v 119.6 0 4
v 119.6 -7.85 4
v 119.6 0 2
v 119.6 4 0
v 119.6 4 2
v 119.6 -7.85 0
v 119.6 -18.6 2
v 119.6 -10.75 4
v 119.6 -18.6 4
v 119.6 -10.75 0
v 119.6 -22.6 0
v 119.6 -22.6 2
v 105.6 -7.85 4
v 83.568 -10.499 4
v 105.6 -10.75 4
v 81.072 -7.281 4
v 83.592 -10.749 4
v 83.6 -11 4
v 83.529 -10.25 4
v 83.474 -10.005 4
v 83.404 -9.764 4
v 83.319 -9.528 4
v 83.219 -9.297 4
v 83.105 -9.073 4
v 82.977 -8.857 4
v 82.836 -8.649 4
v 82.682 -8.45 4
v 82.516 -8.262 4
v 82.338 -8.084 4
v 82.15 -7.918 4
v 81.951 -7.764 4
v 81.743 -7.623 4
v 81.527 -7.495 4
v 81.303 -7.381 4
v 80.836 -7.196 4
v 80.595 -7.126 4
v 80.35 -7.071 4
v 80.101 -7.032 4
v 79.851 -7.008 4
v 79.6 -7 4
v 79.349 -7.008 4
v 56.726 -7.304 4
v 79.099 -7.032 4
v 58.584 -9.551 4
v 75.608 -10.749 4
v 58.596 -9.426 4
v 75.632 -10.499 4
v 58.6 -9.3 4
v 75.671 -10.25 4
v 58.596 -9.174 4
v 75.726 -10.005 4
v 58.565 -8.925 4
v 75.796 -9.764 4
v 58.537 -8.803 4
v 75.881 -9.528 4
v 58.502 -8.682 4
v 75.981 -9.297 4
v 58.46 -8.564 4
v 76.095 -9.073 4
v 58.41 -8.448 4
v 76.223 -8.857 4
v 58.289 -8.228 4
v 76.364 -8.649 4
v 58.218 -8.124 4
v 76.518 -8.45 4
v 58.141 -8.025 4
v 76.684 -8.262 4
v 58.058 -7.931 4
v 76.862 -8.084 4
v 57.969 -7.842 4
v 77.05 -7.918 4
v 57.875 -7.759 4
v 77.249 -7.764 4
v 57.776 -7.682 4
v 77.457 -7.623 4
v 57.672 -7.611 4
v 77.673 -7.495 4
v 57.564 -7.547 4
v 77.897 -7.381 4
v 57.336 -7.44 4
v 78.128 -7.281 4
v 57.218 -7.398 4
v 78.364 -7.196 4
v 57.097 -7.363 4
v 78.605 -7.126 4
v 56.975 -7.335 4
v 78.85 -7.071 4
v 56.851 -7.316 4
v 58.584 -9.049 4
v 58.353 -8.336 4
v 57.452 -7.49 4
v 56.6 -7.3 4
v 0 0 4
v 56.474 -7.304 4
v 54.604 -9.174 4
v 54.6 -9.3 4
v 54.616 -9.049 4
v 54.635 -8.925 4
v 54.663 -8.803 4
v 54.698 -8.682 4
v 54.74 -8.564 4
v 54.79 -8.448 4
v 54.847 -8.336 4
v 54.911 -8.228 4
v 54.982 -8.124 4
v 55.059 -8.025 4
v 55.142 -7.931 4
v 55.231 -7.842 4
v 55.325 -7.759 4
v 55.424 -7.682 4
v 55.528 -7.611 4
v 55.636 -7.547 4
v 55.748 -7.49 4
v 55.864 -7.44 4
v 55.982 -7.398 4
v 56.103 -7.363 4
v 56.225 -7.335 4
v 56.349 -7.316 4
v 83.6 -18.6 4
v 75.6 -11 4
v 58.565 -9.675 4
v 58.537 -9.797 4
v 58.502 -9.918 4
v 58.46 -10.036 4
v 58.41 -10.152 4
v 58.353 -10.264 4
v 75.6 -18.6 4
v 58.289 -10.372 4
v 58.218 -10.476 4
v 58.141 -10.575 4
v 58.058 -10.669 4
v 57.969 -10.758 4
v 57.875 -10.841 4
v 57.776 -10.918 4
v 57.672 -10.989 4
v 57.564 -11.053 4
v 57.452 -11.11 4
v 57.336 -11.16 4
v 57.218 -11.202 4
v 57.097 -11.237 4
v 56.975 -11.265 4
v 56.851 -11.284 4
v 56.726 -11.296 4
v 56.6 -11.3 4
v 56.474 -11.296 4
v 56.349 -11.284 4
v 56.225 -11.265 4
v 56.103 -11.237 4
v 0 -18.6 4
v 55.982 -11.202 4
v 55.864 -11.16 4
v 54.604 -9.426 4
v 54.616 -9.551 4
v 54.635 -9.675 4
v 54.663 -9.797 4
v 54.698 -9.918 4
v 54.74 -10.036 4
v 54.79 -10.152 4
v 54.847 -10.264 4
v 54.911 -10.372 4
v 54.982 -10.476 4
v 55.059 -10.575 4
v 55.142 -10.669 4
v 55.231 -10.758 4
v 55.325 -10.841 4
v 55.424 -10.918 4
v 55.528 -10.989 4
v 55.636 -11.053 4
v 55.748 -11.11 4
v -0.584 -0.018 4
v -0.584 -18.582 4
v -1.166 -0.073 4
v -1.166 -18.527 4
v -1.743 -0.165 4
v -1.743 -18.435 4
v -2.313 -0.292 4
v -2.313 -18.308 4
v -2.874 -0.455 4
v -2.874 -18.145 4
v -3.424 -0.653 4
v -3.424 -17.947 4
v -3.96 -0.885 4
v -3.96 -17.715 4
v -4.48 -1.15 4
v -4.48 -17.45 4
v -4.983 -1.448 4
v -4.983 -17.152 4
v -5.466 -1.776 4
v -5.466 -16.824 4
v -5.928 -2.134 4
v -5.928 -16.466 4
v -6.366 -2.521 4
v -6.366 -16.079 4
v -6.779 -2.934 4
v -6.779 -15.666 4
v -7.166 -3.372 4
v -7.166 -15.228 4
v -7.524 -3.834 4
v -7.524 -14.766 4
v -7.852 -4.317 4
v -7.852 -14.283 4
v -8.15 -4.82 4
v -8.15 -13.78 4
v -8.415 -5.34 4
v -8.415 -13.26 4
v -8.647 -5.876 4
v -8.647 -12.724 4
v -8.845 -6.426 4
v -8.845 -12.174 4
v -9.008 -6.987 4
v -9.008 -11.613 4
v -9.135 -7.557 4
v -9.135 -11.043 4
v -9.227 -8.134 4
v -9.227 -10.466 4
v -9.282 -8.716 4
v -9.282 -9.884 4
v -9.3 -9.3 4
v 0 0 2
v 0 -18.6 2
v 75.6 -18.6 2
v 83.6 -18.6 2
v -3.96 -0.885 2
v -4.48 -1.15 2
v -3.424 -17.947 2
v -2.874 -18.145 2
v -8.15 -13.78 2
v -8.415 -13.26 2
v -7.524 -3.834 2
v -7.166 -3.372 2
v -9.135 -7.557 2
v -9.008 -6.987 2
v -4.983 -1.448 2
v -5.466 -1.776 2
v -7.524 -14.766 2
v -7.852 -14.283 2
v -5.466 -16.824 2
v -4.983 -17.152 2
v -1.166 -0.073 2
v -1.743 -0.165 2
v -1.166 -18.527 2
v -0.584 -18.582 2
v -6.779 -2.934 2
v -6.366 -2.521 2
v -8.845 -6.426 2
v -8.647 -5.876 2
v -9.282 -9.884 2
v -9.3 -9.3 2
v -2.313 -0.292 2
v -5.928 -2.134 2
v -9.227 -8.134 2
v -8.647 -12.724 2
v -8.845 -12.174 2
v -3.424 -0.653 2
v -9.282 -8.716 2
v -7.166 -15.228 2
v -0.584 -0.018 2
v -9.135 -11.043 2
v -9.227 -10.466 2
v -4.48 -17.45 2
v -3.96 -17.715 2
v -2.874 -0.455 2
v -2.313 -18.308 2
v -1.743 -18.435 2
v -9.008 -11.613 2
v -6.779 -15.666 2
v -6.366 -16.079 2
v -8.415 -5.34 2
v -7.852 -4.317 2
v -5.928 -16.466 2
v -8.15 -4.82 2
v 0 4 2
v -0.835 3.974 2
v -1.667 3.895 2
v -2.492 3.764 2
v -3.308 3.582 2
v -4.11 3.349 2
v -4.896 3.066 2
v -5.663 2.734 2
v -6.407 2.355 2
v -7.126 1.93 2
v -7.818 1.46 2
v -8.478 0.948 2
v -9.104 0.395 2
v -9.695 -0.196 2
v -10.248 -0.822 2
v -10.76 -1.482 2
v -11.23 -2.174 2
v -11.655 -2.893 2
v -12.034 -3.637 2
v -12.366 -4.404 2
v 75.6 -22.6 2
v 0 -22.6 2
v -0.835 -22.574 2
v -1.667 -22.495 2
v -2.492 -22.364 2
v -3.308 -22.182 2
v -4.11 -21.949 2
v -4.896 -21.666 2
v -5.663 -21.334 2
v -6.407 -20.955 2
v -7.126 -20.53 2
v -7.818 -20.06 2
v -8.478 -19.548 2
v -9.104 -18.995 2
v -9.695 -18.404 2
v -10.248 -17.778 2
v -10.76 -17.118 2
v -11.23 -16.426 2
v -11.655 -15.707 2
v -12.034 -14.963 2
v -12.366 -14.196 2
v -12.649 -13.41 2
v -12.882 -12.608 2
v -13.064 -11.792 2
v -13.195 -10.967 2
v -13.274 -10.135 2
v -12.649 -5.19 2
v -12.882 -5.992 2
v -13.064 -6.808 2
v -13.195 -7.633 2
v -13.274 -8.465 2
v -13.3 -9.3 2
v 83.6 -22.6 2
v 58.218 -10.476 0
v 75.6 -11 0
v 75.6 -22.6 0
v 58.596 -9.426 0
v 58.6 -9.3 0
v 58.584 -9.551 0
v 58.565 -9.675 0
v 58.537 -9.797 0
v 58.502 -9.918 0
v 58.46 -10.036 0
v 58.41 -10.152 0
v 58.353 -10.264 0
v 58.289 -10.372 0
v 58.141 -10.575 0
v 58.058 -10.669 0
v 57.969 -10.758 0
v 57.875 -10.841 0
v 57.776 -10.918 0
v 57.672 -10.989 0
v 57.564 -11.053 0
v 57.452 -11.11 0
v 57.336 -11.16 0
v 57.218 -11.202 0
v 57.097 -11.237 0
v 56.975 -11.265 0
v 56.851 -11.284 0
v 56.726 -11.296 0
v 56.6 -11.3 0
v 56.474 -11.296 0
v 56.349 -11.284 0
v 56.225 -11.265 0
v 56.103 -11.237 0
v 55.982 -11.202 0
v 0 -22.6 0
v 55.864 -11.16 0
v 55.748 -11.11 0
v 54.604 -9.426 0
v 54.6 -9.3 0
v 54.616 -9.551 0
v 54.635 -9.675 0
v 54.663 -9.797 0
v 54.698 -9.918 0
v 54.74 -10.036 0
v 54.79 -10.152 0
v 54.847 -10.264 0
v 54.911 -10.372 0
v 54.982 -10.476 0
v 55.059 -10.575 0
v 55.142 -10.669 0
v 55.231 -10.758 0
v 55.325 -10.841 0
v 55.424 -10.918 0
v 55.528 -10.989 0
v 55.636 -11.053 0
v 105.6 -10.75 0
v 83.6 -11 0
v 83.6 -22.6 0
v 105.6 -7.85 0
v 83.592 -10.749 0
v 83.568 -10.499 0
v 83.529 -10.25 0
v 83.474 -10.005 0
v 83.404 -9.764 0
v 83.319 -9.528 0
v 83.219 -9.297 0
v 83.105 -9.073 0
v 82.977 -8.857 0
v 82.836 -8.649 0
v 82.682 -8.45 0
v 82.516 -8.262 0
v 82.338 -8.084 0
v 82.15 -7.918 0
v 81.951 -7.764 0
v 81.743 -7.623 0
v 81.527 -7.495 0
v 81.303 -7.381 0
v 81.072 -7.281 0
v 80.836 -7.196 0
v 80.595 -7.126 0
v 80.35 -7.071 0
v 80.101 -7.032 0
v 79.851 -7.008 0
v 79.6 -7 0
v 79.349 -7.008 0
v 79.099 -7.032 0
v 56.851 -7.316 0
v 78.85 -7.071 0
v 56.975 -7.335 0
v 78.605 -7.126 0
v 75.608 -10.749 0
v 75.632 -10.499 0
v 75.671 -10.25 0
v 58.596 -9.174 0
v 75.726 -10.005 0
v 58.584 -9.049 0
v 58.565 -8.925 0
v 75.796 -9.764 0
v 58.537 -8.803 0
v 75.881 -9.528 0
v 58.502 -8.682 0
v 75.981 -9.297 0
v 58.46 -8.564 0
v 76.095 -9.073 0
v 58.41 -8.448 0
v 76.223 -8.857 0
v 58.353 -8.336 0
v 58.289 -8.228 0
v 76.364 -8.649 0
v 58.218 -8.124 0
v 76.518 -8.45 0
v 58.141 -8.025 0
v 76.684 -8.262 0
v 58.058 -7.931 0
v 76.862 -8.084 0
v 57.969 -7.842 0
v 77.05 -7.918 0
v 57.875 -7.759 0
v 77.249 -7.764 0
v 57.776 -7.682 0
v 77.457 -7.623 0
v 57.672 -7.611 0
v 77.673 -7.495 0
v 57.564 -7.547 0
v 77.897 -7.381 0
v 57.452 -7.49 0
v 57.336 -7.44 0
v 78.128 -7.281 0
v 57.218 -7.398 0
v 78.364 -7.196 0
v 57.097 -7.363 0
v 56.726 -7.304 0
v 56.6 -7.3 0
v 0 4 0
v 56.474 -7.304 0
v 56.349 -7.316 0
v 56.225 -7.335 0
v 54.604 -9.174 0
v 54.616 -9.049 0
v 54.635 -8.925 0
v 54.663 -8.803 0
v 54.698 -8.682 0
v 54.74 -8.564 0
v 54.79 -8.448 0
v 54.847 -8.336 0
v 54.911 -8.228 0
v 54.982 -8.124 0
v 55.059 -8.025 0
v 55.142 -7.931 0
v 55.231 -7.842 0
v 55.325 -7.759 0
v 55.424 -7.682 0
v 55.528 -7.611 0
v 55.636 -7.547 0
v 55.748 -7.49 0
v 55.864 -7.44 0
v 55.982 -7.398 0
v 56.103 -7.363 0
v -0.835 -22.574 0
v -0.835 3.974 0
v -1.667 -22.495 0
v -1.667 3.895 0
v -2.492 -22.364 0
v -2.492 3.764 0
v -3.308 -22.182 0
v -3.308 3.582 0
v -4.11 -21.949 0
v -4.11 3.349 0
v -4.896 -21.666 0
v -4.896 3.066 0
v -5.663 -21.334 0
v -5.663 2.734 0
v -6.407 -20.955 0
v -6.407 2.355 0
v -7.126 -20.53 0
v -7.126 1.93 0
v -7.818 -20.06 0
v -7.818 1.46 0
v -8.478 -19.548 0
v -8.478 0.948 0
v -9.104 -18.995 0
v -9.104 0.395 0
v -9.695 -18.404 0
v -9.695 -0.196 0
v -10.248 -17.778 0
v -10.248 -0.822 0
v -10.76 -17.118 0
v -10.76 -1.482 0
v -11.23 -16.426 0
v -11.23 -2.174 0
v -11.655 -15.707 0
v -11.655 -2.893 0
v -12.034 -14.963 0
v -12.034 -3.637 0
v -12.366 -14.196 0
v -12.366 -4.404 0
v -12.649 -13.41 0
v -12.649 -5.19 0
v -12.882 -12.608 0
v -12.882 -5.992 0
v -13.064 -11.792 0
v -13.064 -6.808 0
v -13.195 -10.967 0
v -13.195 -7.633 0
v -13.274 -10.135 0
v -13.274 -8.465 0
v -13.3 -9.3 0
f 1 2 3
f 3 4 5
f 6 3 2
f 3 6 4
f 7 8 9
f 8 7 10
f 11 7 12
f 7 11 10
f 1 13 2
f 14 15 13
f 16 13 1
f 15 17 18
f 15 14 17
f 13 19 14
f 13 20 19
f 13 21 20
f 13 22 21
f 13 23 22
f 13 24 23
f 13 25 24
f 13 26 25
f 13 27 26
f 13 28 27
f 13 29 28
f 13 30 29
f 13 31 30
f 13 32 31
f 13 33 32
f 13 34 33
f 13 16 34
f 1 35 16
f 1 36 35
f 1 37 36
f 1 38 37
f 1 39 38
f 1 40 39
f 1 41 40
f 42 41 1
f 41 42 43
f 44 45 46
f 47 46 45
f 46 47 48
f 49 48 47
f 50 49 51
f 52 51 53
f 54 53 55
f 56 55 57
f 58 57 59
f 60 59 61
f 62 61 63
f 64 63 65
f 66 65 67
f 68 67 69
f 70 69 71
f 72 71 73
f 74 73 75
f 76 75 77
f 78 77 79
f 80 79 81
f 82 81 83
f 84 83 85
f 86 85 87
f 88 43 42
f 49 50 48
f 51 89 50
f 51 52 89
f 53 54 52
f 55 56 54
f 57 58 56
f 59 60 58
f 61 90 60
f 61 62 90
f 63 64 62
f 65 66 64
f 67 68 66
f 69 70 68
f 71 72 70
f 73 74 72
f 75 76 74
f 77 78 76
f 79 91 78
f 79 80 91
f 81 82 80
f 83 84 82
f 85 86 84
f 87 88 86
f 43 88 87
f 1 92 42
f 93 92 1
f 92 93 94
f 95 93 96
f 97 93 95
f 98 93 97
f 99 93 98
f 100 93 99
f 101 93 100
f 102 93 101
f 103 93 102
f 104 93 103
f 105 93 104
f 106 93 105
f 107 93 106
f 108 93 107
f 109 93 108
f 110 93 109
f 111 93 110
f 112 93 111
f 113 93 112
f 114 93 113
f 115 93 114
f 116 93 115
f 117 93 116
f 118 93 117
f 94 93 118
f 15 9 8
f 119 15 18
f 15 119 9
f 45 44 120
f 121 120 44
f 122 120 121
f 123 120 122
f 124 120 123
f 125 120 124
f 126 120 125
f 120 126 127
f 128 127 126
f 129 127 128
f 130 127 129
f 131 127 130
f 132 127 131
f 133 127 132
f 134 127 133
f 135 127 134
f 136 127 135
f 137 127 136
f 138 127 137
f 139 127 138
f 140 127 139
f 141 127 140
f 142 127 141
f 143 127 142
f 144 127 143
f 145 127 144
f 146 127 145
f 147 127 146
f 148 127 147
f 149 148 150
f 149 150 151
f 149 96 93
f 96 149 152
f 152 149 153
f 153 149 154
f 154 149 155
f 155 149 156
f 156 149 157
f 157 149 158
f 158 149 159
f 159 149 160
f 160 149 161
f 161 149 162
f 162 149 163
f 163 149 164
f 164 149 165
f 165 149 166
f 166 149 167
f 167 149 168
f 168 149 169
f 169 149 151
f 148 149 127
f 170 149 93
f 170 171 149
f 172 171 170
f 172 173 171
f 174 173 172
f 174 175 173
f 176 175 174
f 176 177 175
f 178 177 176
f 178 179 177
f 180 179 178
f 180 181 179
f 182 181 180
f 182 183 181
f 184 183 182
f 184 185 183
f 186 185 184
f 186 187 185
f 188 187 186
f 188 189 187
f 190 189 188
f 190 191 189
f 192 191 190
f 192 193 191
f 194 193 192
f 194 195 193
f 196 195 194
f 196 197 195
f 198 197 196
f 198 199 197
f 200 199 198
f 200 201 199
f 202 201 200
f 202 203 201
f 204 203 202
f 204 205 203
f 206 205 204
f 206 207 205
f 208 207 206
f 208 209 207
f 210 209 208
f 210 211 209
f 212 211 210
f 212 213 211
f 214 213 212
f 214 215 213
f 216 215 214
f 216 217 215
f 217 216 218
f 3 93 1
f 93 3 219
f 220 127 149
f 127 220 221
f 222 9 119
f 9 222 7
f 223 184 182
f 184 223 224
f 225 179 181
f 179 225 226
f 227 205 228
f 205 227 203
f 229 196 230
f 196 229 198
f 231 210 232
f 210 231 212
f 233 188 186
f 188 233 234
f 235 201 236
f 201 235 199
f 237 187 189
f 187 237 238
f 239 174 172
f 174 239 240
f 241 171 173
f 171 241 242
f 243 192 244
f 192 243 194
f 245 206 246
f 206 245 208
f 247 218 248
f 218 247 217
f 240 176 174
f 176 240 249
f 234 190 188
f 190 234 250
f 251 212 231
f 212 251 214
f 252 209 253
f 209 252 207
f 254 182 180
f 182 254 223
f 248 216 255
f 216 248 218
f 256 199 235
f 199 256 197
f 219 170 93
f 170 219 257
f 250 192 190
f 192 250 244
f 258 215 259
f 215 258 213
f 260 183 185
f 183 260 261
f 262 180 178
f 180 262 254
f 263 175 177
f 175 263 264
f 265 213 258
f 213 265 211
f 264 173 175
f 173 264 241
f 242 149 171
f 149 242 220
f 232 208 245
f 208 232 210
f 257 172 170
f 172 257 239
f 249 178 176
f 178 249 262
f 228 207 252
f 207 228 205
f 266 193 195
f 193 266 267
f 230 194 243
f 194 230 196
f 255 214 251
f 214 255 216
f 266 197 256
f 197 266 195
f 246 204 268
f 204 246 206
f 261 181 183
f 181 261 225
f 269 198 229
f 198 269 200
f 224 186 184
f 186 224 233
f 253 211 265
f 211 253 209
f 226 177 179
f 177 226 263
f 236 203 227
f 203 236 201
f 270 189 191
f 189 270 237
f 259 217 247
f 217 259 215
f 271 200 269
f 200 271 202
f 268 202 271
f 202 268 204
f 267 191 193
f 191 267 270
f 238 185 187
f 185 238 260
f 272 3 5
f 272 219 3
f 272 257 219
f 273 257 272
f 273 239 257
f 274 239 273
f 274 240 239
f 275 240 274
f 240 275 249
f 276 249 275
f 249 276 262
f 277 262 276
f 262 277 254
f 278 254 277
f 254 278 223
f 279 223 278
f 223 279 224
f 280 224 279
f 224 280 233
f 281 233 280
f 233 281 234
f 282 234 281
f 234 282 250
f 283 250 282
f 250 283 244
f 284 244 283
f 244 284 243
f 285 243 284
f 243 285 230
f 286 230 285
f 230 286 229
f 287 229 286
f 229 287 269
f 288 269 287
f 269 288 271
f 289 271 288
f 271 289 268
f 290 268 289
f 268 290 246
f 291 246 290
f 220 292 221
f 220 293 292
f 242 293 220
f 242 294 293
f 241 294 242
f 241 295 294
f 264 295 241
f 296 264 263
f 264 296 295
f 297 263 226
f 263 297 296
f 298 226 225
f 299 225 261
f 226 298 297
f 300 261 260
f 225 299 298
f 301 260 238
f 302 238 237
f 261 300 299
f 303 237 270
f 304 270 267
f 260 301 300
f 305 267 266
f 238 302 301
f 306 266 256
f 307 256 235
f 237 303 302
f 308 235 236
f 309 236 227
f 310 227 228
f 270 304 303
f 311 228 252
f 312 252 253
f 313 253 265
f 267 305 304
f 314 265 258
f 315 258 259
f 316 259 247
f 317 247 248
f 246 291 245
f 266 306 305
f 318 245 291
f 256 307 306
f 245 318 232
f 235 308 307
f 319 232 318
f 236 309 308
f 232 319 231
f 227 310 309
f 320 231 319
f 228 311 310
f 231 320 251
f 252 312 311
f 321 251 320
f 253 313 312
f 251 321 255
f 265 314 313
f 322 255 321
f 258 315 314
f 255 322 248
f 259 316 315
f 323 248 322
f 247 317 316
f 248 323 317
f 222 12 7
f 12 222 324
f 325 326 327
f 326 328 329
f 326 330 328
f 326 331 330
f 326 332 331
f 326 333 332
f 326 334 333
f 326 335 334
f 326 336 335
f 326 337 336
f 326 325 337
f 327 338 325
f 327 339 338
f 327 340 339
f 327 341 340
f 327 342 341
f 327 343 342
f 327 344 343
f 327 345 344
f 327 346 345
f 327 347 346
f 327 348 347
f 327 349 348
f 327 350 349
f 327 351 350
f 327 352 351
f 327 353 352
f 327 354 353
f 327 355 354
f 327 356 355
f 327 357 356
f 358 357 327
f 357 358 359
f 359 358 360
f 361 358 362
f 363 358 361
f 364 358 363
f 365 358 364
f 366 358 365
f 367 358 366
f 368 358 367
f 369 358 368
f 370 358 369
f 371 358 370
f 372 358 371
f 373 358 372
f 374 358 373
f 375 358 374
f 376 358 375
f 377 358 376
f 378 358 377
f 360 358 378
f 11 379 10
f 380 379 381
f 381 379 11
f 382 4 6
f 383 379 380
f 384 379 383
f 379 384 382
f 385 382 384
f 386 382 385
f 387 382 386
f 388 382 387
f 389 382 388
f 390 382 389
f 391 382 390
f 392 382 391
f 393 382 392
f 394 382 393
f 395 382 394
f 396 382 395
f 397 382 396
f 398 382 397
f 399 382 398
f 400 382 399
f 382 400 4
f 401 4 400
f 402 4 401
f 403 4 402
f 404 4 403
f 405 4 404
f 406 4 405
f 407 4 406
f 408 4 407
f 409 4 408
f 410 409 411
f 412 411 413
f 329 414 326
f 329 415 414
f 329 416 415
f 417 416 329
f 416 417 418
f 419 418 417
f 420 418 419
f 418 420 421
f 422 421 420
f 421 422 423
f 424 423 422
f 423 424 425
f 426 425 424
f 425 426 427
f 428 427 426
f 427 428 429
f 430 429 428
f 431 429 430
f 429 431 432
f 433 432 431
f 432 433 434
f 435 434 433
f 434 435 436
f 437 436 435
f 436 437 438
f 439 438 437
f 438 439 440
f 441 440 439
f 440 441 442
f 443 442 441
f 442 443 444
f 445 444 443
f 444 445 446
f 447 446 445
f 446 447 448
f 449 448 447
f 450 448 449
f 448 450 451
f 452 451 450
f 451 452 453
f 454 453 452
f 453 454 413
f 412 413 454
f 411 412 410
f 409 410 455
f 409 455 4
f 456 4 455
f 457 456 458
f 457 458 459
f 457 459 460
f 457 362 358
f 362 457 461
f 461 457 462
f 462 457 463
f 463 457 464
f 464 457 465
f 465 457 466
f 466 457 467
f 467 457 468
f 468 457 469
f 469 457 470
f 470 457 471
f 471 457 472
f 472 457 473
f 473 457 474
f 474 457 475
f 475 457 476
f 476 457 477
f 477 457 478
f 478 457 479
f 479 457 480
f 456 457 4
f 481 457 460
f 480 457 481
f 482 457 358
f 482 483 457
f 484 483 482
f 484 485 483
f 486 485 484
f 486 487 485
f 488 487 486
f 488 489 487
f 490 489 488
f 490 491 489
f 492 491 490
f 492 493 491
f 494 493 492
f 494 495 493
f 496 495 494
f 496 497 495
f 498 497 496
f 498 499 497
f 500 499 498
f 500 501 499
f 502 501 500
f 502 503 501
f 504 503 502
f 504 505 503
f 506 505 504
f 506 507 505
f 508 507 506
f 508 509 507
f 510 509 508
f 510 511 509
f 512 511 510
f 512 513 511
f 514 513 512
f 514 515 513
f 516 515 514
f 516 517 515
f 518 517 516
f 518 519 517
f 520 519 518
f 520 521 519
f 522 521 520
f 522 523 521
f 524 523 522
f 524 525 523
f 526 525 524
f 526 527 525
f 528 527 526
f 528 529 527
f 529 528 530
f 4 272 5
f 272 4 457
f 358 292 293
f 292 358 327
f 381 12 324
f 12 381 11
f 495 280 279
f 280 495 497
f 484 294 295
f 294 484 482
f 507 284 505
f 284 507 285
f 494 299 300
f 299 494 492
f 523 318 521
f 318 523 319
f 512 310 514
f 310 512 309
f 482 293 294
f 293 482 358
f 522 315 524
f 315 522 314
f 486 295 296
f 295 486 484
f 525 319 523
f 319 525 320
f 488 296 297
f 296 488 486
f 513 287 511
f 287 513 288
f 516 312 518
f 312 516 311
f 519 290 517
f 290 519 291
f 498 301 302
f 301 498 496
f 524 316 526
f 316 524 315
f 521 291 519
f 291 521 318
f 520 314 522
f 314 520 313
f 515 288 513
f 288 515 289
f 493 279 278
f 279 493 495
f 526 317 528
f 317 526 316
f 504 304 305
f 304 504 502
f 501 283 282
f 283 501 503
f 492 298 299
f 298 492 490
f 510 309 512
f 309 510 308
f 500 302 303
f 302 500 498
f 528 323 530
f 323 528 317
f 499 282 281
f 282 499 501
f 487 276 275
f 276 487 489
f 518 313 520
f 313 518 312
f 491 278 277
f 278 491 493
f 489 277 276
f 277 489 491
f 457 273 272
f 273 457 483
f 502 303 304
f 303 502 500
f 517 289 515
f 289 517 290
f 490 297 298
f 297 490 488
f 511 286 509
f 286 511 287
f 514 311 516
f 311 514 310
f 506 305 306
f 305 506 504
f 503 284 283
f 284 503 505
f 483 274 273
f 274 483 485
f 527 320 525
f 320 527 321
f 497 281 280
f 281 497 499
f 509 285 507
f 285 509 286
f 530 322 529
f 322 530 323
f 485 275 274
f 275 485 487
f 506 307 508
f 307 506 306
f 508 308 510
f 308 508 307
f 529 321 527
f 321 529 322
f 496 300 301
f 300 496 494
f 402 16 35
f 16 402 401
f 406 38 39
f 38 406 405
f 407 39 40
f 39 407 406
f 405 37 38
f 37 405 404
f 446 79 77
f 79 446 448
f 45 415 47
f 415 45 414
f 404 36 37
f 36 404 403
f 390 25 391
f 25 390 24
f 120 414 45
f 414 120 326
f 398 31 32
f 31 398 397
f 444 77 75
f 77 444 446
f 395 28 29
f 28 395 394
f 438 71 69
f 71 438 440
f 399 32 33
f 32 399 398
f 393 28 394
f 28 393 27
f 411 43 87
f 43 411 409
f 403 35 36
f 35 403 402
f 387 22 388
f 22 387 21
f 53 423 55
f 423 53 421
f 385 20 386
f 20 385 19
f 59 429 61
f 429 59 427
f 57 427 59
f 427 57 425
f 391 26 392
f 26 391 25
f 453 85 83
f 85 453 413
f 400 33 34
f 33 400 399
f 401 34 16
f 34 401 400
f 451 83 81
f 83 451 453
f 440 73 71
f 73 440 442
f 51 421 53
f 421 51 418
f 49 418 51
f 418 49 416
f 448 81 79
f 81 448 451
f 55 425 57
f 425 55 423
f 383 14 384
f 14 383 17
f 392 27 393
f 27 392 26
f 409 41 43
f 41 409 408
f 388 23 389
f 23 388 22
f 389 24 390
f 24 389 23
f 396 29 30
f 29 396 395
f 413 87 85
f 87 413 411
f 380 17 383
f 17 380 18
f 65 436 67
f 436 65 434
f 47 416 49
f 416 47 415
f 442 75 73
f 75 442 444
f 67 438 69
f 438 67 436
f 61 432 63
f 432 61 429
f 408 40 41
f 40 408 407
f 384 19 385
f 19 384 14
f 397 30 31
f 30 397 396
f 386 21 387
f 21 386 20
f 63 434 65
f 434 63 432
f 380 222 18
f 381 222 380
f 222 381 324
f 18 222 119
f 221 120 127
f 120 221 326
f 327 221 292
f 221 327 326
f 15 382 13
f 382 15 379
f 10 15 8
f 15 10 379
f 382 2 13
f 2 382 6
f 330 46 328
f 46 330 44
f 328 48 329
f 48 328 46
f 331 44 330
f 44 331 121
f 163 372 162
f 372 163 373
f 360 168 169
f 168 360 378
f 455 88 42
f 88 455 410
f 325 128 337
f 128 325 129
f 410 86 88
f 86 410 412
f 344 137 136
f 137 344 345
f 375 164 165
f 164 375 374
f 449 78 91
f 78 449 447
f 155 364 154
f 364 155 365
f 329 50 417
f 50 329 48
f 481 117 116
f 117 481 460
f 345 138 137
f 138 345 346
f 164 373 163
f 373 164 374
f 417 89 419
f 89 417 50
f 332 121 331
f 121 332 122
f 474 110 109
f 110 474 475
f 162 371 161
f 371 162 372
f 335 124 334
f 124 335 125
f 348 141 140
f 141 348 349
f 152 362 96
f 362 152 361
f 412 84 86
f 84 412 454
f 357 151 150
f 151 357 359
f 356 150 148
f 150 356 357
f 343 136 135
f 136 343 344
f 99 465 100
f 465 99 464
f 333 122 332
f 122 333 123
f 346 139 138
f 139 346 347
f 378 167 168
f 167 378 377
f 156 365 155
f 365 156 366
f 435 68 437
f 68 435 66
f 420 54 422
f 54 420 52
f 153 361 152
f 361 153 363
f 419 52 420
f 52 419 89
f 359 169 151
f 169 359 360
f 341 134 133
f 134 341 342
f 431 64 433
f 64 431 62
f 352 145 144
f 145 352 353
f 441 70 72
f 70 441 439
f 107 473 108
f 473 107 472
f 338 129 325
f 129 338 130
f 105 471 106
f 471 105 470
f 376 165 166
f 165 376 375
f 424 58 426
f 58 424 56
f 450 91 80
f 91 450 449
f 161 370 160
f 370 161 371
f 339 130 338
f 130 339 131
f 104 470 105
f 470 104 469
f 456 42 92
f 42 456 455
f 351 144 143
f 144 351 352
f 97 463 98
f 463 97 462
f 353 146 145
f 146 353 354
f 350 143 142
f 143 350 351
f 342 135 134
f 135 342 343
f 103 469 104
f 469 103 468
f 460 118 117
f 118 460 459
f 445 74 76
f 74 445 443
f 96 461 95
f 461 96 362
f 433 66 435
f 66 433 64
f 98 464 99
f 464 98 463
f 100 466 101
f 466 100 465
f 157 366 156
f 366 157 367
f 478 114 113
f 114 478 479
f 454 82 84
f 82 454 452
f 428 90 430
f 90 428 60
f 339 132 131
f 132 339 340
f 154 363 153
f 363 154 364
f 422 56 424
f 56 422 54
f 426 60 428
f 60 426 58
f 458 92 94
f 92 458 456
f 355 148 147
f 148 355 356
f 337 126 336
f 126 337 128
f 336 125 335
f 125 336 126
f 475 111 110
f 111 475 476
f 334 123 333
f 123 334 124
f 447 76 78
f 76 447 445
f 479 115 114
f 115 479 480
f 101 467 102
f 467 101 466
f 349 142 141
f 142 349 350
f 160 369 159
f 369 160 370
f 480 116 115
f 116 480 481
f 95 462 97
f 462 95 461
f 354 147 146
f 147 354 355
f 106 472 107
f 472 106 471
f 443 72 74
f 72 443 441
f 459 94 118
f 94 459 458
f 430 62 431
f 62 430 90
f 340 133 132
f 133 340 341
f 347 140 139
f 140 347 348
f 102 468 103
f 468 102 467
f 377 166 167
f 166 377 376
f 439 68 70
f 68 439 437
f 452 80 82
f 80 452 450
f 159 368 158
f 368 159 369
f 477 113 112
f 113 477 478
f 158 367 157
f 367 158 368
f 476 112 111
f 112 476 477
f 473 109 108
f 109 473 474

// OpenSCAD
l = 119.6;
r = 9.3;
h = 4;
del = 4;
cut_length = 14;
cut_width = 2.9;

rotate( 180, [ 1, 0, 0 ] )
difference(){

    translate( [ 0, r, 0 ] )
    rotate( 180, [ 1, 0, 0  ] )
    translate( [ 0, -r, 0 ] )
    union(){
        translate( [ 0, 0, 1 ] )
        {
            cube( [ l, 2 * r, h - 1 ] );
            translate( [ 0, r, 0 ] )
                cylinder( r = r, h = h - 1, $fn = 100 );
        }
        
        translate( [ 0, -del, 0 ] )
            cube( [ l, 2 * ( r + del ), h / 2 ] );
        translate( [ 0, r, 0 ] )
            cylinder( r = r + del, h = h / 2, $fn = 100 );
    }

    translate( [ l - 40, 11, -6 ] )
        rotate( -90, [ 0, 0, 1 ] )
            translate( [ 0, 0, -1 ] )
            {
                cylinder( r = 4, h = 15, $fn = 100 );
                translate( [ -15, -4, 0 ] )
                    cube( [ 15, 8, 10 ] );
            }
            
    translate( [ l - cut_length, r - cut_width / 2, -6 ] )   
        cube( [ cut_length + 1, cut_width, 20 ] );
            
    translate( [ l - 63, r, -6 ] )
        cylinder( h = 20, r = 2, $fn = 100 );
}
